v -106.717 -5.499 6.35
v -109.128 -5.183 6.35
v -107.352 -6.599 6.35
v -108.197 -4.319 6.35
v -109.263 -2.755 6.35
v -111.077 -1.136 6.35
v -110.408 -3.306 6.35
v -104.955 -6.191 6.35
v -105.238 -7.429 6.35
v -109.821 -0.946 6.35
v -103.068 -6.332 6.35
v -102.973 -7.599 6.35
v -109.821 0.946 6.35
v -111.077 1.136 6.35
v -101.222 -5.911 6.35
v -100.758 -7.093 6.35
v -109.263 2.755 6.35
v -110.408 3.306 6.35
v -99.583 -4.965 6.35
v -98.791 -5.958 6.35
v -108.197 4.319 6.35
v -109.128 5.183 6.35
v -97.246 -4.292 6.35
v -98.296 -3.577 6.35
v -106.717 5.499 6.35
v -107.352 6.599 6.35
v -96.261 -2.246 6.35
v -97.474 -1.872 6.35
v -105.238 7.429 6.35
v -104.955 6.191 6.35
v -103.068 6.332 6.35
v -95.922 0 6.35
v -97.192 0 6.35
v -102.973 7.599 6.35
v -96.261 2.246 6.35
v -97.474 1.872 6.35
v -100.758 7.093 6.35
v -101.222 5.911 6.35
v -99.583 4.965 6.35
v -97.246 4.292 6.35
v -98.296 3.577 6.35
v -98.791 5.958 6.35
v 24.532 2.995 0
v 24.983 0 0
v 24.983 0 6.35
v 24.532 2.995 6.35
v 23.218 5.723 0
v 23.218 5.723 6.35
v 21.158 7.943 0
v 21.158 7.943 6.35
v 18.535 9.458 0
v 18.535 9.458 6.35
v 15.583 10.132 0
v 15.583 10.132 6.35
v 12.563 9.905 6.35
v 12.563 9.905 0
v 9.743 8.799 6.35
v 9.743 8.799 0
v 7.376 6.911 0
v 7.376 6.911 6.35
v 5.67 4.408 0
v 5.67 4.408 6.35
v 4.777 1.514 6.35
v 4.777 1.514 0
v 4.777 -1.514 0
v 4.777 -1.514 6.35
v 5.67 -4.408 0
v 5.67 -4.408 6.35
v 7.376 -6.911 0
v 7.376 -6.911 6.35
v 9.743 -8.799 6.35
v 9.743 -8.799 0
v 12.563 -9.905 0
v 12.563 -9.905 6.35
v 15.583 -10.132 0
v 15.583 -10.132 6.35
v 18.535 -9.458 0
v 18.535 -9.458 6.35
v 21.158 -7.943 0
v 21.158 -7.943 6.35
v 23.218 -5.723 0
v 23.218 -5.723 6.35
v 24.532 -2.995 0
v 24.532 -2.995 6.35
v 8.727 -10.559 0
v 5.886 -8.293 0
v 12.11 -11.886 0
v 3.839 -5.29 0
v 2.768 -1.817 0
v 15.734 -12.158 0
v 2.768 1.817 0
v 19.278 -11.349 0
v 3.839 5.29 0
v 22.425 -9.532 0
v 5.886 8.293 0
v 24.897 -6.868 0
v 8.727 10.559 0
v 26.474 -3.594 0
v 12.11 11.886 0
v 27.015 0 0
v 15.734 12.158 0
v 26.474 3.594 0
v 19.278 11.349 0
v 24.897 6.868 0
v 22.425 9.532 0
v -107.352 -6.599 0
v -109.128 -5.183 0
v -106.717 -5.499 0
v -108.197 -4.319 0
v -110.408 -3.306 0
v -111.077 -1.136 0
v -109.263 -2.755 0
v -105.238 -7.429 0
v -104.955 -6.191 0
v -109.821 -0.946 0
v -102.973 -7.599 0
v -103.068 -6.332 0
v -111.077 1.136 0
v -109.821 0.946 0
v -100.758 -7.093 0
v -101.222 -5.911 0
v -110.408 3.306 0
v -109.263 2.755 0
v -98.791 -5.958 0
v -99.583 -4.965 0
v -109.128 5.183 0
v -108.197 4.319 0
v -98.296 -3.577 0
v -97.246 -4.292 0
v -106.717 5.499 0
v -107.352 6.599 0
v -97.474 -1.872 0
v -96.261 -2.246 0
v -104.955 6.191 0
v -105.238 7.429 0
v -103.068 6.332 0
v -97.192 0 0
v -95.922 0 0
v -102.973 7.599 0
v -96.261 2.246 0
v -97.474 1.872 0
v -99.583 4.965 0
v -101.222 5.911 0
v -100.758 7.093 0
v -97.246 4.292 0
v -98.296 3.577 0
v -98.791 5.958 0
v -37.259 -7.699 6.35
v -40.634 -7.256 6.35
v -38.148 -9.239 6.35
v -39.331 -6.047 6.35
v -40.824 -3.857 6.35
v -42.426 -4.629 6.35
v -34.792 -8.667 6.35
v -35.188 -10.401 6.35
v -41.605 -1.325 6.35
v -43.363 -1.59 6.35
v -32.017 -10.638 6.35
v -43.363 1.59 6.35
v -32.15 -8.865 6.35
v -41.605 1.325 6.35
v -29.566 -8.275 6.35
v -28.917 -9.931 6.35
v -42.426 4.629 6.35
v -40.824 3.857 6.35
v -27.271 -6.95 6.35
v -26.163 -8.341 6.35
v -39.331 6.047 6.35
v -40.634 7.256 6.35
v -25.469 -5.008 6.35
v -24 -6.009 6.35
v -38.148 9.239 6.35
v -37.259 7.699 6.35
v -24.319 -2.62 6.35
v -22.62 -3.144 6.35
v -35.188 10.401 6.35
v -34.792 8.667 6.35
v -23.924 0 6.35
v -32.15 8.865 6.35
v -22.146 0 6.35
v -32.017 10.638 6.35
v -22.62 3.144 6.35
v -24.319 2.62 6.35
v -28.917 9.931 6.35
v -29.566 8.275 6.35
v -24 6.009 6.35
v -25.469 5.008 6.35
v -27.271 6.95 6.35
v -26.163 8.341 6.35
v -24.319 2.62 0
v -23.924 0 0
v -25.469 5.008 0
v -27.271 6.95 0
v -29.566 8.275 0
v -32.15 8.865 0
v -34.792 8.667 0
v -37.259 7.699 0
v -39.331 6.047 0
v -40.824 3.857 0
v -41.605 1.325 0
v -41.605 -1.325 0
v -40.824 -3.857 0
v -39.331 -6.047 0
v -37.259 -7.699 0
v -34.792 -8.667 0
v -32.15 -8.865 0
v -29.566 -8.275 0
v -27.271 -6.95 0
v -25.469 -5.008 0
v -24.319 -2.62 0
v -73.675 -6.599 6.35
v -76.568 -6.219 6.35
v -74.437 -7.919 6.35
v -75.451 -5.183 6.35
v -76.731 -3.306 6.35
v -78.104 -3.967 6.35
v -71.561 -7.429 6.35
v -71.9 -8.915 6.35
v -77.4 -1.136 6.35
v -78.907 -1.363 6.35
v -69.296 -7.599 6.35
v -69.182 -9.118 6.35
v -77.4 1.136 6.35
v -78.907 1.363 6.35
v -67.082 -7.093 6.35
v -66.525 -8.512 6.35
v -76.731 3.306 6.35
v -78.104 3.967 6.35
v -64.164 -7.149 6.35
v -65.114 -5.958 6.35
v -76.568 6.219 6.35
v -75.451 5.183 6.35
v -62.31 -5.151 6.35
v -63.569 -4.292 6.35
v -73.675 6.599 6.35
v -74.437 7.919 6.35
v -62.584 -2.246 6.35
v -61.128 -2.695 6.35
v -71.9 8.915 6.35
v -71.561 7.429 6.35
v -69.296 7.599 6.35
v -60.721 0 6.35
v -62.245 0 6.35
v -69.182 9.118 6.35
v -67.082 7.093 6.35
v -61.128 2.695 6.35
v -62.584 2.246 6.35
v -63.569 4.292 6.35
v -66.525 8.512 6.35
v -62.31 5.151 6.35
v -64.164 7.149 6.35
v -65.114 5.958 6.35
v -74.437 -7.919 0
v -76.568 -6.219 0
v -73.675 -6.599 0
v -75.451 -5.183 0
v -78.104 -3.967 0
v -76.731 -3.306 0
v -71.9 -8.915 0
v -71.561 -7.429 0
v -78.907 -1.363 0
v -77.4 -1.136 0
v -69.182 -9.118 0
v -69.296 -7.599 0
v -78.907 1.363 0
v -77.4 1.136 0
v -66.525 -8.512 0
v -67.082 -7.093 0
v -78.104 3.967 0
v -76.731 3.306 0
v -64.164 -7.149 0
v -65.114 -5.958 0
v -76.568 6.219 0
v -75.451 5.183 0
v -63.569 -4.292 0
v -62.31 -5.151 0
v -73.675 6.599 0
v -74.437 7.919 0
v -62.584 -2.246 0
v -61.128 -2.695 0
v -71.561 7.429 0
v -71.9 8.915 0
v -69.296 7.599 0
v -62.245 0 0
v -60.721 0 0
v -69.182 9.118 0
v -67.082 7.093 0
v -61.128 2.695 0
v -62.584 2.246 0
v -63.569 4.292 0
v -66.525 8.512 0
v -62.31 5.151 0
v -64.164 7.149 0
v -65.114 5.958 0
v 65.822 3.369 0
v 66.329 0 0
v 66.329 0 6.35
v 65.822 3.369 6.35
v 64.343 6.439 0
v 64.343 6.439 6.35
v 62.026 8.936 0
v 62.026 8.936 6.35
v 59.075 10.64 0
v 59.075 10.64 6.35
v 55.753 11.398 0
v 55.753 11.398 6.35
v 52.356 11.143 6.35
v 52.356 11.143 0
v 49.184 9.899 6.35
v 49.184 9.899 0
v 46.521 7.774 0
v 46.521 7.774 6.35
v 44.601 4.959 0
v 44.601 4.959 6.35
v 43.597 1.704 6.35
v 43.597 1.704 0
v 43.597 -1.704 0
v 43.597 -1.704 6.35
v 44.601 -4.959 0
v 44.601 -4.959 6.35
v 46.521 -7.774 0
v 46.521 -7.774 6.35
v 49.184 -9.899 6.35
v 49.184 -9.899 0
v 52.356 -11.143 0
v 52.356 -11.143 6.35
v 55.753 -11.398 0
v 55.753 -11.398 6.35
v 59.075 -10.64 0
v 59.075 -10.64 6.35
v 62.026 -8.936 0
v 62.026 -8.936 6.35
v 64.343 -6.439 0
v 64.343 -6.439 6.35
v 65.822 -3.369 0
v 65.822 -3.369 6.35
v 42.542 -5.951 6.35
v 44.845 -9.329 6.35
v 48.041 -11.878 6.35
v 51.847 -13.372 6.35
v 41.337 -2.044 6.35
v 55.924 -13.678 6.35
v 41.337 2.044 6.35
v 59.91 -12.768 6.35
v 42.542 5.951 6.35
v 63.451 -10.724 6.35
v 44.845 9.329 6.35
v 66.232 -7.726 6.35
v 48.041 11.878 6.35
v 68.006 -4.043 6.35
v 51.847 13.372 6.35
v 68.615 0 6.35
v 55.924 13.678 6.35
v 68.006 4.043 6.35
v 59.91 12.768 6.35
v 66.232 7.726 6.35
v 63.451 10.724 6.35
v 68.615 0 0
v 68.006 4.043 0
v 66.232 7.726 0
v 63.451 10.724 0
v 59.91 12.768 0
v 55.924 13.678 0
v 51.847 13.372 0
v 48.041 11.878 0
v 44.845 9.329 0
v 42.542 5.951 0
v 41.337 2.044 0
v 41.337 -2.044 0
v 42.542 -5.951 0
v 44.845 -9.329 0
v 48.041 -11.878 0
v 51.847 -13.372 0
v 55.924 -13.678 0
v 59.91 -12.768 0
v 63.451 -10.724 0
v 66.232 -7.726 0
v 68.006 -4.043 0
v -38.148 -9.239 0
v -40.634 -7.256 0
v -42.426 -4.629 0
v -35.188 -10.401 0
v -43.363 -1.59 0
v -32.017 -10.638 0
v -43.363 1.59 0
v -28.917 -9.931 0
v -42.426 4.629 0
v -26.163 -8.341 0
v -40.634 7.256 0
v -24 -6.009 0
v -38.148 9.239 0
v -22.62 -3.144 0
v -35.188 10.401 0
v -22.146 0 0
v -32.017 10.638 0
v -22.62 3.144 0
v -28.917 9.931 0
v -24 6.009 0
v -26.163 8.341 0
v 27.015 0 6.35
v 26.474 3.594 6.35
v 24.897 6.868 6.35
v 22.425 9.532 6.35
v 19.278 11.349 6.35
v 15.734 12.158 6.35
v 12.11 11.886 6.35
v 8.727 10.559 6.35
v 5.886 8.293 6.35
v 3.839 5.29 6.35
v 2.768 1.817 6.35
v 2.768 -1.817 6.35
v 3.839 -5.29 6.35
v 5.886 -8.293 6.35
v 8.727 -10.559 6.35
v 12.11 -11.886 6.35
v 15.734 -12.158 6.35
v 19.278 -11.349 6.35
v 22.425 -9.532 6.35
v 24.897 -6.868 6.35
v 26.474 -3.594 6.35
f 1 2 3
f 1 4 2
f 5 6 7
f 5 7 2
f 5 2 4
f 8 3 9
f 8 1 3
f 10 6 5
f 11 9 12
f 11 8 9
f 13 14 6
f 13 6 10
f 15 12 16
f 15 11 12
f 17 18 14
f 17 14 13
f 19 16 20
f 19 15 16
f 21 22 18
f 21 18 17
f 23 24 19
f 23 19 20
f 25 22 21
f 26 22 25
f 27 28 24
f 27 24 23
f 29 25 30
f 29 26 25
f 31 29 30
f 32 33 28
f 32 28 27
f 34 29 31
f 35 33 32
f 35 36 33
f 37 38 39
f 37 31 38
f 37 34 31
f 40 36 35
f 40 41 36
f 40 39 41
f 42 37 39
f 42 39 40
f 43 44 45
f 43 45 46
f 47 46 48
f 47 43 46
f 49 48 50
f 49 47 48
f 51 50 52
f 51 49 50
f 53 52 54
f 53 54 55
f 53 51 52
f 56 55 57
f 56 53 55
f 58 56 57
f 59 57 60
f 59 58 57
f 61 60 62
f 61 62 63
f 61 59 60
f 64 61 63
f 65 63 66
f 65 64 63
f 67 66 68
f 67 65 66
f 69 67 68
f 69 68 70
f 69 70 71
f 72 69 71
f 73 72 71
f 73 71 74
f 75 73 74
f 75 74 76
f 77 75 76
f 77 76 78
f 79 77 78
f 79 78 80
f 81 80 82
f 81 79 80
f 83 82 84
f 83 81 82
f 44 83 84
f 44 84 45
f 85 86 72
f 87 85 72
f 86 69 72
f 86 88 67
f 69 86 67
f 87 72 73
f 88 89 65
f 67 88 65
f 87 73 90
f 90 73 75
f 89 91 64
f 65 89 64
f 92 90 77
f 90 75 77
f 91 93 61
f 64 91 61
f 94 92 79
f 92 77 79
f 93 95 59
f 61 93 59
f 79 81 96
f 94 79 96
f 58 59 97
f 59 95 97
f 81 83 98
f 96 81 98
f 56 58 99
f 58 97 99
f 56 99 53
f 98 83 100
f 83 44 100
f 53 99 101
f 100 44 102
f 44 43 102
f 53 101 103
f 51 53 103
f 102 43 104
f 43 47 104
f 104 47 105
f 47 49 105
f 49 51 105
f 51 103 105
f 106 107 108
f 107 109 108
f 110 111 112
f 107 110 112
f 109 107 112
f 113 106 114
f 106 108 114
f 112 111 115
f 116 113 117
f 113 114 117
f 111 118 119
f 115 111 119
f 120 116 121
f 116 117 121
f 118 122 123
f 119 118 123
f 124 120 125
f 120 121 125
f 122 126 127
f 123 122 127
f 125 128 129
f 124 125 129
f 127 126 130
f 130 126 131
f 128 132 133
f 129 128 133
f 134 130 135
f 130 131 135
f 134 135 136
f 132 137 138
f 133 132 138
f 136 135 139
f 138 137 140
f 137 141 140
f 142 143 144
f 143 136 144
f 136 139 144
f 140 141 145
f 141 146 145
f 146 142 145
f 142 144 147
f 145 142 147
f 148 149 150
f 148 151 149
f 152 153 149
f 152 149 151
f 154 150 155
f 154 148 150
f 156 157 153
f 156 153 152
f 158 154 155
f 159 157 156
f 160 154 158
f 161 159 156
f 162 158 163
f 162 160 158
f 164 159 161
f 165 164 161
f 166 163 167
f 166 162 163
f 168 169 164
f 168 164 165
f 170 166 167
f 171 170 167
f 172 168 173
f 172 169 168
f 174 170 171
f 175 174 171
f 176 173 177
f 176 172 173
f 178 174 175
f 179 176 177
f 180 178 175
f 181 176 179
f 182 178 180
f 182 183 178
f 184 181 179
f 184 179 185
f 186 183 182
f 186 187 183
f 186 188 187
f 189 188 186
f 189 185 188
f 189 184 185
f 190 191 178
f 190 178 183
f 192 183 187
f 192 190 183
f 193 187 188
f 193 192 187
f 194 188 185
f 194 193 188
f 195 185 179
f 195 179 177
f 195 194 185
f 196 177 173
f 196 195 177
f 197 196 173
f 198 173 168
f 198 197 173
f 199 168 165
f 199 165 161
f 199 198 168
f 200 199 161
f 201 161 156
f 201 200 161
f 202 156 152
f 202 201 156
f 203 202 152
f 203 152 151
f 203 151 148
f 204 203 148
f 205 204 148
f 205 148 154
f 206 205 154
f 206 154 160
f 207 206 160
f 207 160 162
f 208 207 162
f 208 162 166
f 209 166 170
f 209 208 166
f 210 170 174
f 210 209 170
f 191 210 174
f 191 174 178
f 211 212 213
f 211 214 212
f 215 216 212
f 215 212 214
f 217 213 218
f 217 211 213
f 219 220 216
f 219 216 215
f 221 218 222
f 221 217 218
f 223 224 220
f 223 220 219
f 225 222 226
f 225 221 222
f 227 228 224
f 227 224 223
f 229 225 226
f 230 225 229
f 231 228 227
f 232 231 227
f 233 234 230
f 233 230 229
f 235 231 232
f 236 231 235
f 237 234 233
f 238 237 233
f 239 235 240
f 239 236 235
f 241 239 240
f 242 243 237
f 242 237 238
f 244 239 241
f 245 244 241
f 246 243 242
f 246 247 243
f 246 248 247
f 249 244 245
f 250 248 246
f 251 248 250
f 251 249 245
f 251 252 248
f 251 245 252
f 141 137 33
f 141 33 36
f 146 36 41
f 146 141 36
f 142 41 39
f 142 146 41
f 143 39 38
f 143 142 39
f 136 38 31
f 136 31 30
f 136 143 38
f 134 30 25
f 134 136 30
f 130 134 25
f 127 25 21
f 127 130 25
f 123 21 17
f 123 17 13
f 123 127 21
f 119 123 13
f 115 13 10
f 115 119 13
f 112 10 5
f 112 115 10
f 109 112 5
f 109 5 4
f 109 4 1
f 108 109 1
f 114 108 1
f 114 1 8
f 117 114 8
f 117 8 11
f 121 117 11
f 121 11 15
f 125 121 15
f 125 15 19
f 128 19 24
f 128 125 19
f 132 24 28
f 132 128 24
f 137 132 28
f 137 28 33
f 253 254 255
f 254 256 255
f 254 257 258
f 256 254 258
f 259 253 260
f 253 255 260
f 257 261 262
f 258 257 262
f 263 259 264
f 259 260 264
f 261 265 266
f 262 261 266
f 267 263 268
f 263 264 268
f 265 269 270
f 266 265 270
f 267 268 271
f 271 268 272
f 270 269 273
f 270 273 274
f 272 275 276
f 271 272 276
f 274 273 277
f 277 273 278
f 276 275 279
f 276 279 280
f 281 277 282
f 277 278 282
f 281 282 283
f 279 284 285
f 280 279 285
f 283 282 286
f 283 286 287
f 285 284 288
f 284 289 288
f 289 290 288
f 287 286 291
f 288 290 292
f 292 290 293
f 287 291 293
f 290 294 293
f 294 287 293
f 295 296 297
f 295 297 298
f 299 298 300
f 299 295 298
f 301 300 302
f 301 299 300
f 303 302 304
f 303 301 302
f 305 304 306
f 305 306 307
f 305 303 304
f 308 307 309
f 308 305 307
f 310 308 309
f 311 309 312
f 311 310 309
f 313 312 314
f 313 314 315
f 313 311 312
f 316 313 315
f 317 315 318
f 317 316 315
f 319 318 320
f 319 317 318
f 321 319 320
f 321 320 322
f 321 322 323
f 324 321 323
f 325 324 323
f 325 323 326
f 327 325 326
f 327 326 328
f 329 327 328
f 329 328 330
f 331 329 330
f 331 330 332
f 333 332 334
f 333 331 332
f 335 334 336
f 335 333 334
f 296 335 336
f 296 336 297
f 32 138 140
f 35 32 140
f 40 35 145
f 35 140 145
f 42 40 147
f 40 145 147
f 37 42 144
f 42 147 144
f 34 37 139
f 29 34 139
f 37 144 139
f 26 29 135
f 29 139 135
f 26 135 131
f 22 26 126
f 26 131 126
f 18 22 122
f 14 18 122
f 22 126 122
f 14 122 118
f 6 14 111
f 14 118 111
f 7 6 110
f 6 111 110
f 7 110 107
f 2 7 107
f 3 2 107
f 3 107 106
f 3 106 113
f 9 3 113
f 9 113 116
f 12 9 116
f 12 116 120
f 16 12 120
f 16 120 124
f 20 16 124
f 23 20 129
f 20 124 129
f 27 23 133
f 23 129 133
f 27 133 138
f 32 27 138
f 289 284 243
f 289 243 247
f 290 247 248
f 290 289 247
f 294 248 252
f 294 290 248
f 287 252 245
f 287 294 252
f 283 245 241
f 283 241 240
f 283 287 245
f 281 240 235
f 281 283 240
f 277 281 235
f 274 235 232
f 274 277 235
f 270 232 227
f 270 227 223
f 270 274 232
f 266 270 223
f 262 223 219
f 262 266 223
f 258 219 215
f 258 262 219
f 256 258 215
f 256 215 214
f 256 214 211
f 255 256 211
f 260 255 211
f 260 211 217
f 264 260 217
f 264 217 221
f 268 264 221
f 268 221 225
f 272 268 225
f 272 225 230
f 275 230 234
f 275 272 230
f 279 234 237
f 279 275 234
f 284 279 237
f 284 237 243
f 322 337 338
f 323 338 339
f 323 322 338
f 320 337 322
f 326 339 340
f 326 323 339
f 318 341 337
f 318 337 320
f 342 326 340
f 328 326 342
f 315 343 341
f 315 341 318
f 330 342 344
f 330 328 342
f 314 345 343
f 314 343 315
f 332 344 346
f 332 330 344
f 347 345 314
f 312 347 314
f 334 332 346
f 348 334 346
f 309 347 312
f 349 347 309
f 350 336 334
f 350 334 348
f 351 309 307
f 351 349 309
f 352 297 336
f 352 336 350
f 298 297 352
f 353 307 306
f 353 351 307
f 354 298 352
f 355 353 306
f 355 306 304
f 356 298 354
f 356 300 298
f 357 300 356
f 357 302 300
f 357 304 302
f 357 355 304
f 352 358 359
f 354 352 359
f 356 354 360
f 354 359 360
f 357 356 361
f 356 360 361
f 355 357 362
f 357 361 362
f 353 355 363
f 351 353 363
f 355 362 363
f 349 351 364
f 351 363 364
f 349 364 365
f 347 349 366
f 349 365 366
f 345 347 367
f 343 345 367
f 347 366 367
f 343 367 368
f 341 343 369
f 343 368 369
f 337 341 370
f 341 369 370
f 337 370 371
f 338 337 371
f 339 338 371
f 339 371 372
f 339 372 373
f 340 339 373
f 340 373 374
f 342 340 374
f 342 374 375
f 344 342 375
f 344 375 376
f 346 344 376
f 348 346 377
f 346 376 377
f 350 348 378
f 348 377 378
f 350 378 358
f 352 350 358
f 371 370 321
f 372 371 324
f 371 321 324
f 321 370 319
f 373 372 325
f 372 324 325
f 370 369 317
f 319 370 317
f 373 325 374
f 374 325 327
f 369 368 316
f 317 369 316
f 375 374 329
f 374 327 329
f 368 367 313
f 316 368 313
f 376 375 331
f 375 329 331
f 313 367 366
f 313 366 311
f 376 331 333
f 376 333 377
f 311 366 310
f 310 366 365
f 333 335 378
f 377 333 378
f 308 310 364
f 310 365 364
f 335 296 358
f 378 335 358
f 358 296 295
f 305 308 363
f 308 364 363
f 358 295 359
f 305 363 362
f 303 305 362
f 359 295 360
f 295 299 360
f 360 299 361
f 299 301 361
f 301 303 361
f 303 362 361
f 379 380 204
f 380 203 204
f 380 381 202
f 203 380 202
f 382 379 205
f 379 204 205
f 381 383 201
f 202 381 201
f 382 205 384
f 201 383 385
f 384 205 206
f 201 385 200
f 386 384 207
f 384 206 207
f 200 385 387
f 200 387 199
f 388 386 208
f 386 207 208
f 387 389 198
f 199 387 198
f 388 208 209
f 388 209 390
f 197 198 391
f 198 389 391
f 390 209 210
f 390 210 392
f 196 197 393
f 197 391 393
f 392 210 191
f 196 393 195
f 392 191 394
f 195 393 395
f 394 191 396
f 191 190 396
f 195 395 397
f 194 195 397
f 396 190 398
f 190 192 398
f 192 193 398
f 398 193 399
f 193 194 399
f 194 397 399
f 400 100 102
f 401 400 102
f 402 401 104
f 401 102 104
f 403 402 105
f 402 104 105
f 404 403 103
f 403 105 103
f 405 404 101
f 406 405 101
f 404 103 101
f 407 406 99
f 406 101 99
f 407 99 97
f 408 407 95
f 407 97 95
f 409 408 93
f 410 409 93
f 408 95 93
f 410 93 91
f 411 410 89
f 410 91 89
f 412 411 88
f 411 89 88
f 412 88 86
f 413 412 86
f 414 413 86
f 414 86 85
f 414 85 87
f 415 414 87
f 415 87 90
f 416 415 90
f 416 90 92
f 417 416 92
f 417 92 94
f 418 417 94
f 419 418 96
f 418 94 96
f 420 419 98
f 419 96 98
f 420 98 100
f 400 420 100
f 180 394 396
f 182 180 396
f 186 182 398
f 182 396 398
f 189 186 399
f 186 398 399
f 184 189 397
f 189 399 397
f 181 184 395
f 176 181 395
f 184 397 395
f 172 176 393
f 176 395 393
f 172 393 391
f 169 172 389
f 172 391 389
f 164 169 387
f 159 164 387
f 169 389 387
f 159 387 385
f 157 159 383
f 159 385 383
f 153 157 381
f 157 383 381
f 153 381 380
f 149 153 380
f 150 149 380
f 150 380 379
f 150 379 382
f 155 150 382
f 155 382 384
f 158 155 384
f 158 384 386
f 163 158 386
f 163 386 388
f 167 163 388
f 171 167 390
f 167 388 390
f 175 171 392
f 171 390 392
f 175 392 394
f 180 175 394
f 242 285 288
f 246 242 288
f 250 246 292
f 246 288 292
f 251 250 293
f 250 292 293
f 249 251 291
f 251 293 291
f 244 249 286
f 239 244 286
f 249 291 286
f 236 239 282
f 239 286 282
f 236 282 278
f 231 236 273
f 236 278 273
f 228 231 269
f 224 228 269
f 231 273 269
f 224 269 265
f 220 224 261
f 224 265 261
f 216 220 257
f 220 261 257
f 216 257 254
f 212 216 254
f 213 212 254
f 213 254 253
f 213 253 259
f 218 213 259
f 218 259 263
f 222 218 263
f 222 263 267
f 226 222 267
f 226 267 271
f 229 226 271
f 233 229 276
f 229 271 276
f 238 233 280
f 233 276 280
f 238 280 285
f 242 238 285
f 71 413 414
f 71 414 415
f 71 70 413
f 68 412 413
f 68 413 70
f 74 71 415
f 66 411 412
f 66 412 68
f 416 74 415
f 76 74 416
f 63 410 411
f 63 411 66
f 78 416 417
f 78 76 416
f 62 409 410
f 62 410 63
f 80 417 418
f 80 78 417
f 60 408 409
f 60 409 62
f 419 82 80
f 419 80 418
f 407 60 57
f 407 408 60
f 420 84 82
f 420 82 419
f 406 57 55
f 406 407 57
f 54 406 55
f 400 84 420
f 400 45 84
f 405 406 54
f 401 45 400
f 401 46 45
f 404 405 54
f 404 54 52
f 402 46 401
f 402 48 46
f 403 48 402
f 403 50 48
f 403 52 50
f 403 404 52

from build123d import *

# Parameters (mm, degrees)
F0_R     = 7.62
F0_R_2   = 6.35
F0_R_3   = 9.144
F0_R_4   = 10.668
F0_R_5   = 8.89
F0_R_6   = 12.192
F0_R_7   = 10.16
F0_R_8   = 13.716
F0_R_9   = 11.43
F1_DEPTH = 6.35


with BuildPart() as f1:
    # F0 (on Top) → F1 (new body)
    with BuildSketch(Plane.XY):
        with Locations((-103.542268, 0)):
            Circle(F0_R)
        with Locations((-103.542268, 0)):
            Circle(F0_R_2, mode=Mode.SUBTRACT)
        with Locations((-69.86542, 0)):
            Circle(F0_R_3)
        with Locations((-69.86542, 0)):
            Circle(F0_R, mode=Mode.SUBTRACT)
        with Locations((-32.814071, 0)):
            Circle(F0_R_4)
        with Locations((-32.814071, 0)):
            Circle(F0_R_5, mode=Mode.SUBTRACT)
        with Locations((14.823379, 0)):
            Circle(F0_R_6)
        with Locations((14.823379, 0)):
            Circle(F0_R_7, mode=Mode.SUBTRACT)
        with Locations((54.899327, 0)):
            Circle(F0_R_8)
        with Locations((54.899327, 0)):
            Circle(F0_R_9, mode=Mode.SUBTRACT)
    extrude(amount=F1_DEPTH)


solid = f1.part
